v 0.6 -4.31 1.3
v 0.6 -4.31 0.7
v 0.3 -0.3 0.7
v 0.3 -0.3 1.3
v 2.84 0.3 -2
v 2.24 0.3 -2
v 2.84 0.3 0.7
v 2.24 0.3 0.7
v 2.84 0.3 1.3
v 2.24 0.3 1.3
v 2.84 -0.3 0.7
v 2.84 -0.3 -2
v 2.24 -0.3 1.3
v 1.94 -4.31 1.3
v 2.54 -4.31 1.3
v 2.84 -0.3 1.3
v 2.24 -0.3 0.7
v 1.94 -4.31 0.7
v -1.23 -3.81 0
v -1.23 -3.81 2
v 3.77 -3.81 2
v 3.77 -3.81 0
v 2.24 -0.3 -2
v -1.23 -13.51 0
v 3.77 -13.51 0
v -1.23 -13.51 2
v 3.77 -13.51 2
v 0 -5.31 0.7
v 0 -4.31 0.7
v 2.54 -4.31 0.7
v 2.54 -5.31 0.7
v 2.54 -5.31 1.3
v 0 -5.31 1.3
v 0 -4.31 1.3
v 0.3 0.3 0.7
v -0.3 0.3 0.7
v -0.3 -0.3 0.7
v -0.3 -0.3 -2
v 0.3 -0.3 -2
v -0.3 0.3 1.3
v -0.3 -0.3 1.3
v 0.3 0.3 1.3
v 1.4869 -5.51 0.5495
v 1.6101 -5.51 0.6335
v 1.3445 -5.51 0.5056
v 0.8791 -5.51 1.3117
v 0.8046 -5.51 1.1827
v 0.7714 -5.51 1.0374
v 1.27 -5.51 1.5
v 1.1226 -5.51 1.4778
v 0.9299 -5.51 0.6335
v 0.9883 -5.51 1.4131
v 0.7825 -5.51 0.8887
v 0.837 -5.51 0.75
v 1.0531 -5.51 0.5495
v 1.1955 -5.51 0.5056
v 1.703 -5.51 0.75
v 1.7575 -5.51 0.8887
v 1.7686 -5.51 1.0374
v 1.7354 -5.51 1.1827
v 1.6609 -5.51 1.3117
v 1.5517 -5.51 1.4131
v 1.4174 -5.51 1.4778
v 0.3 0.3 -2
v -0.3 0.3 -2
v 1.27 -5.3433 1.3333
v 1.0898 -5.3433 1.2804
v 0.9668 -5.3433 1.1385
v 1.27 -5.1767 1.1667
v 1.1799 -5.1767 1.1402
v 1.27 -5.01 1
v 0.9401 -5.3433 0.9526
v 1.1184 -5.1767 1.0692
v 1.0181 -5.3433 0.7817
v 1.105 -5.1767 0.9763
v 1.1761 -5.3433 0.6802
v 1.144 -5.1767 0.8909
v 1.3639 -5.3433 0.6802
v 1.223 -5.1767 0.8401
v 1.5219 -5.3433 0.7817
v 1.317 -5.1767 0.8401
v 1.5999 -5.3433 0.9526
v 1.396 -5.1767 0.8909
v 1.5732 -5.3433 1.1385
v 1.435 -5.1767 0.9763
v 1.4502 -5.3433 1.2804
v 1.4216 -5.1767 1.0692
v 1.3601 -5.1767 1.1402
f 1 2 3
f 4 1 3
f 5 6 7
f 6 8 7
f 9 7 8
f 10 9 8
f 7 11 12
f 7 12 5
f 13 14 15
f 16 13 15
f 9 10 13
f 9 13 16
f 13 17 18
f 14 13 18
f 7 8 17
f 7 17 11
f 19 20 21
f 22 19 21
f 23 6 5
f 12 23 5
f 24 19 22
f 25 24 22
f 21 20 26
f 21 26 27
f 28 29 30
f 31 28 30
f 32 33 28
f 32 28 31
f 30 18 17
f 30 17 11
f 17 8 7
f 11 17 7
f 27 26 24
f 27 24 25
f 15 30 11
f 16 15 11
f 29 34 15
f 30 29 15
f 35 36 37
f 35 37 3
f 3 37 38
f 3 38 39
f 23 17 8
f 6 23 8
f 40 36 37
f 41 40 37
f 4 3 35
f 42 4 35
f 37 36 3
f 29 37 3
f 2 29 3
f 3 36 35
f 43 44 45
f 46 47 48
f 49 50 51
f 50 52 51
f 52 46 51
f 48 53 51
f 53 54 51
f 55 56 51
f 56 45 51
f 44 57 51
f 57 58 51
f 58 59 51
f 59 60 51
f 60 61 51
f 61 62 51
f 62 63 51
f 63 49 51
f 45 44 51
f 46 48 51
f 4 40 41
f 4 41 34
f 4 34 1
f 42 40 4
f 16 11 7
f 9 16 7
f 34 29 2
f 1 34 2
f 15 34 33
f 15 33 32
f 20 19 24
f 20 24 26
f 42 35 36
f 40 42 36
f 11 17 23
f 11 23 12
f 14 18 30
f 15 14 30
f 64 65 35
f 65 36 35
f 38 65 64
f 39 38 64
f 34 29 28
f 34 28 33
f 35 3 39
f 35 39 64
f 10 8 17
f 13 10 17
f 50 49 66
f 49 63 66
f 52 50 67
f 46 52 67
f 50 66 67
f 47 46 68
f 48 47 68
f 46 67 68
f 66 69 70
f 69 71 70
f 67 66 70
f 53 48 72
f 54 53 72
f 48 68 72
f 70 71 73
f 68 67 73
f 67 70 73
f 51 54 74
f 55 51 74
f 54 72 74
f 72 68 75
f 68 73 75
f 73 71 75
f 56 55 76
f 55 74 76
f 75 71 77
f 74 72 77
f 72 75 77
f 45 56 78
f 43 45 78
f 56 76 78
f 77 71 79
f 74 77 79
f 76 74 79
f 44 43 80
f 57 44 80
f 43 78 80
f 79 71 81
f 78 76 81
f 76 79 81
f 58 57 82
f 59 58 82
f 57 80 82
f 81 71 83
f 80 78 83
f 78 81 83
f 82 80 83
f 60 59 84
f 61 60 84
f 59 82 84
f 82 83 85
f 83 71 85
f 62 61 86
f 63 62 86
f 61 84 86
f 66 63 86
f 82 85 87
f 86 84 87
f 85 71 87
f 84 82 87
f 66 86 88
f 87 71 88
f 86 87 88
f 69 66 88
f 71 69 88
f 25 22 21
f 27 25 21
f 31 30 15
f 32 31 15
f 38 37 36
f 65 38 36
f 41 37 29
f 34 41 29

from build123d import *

# Parameters (mm, degrees)
SKETCH_W       = 0.6
SKETCH_H       = 0.6
PAD_DEPTH      = 0.7
PAD_DEPTH_BACK = 2
PAD001_DEPTH   = 0.6
SKETCH002_W    = 2.54
SKETCH002_H    = 0.6
PAD002_DEPTH   = 1
SKETCH004_W    = 5
SKETCH004_H    = 2
PAD003_DEPTH   = 9.7


with BuildPart() as pad:
    # Sketch → Pad (new body, two sides)
    with BuildSketch(Plane.XY) as pad_sk:
        Rectangle(SKETCH_W, SKETCH_H)
        with Locations((2.54, 0)):
            Rectangle(SKETCH_W, SKETCH_H)
    extrude(amount=PAD_DEPTH)
    extrude(pad_sk.sketch, amount=-PAD_DEPTH_BACK)


with BuildPart() as pad001:
    # Sketch001 → Pad001 (new body)
    with BuildSketch(Plane.XY.offset(0.7)):
        Polygon((0.3, 0.3), (-0.3, 0.3), (-0.3, -0.3), (0, -4.31), (0.6, -4.31), (0.3, -0.3), align=None)
        Polygon((2.84, 0.3), (2.24, 0.3), (2.24, -0.3), (1.94, -4.31), (2.54, -4.31), (2.84, -0.3), align=None)
    extrude(amount=PAD001_DEPTH)


with BuildPart() as pad002:
    # Sketch002 → Pad002 (new body)
    with BuildSketch(Plane.XZ.offset(4.31)):
        with Locations((1.27, 1)):
            Rectangle(SKETCH002_W, SKETCH002_H)
    extrude(amount=PAD002_DEPTH)


with BuildPart() as pad003:
    # Sketch004 → Pad003 (new body)
    with BuildSketch(Plane.XZ.offset(3.81)):
        with Locations((1.27, 1)):
            Rectangle(SKETCH004_W, SKETCH004_H)
    extrude(amount=PAD003_DEPTH)


with BuildPart() as revolution001:
    # Sketch005 → Revolution001 (revolve)
    with BuildSketch(Plane.YZ.offset(1.27)):
        Polygon((-5.01, 1), (-5.51, 1), (-5.51, 1.5), align=None)
    revolve(axis=Axis((1.27, -3.977201, 1), (0, -1, 0)))


solid = Compound([pad.part, pad001.part, pad002.part, pad003.part, revolution001.part])
